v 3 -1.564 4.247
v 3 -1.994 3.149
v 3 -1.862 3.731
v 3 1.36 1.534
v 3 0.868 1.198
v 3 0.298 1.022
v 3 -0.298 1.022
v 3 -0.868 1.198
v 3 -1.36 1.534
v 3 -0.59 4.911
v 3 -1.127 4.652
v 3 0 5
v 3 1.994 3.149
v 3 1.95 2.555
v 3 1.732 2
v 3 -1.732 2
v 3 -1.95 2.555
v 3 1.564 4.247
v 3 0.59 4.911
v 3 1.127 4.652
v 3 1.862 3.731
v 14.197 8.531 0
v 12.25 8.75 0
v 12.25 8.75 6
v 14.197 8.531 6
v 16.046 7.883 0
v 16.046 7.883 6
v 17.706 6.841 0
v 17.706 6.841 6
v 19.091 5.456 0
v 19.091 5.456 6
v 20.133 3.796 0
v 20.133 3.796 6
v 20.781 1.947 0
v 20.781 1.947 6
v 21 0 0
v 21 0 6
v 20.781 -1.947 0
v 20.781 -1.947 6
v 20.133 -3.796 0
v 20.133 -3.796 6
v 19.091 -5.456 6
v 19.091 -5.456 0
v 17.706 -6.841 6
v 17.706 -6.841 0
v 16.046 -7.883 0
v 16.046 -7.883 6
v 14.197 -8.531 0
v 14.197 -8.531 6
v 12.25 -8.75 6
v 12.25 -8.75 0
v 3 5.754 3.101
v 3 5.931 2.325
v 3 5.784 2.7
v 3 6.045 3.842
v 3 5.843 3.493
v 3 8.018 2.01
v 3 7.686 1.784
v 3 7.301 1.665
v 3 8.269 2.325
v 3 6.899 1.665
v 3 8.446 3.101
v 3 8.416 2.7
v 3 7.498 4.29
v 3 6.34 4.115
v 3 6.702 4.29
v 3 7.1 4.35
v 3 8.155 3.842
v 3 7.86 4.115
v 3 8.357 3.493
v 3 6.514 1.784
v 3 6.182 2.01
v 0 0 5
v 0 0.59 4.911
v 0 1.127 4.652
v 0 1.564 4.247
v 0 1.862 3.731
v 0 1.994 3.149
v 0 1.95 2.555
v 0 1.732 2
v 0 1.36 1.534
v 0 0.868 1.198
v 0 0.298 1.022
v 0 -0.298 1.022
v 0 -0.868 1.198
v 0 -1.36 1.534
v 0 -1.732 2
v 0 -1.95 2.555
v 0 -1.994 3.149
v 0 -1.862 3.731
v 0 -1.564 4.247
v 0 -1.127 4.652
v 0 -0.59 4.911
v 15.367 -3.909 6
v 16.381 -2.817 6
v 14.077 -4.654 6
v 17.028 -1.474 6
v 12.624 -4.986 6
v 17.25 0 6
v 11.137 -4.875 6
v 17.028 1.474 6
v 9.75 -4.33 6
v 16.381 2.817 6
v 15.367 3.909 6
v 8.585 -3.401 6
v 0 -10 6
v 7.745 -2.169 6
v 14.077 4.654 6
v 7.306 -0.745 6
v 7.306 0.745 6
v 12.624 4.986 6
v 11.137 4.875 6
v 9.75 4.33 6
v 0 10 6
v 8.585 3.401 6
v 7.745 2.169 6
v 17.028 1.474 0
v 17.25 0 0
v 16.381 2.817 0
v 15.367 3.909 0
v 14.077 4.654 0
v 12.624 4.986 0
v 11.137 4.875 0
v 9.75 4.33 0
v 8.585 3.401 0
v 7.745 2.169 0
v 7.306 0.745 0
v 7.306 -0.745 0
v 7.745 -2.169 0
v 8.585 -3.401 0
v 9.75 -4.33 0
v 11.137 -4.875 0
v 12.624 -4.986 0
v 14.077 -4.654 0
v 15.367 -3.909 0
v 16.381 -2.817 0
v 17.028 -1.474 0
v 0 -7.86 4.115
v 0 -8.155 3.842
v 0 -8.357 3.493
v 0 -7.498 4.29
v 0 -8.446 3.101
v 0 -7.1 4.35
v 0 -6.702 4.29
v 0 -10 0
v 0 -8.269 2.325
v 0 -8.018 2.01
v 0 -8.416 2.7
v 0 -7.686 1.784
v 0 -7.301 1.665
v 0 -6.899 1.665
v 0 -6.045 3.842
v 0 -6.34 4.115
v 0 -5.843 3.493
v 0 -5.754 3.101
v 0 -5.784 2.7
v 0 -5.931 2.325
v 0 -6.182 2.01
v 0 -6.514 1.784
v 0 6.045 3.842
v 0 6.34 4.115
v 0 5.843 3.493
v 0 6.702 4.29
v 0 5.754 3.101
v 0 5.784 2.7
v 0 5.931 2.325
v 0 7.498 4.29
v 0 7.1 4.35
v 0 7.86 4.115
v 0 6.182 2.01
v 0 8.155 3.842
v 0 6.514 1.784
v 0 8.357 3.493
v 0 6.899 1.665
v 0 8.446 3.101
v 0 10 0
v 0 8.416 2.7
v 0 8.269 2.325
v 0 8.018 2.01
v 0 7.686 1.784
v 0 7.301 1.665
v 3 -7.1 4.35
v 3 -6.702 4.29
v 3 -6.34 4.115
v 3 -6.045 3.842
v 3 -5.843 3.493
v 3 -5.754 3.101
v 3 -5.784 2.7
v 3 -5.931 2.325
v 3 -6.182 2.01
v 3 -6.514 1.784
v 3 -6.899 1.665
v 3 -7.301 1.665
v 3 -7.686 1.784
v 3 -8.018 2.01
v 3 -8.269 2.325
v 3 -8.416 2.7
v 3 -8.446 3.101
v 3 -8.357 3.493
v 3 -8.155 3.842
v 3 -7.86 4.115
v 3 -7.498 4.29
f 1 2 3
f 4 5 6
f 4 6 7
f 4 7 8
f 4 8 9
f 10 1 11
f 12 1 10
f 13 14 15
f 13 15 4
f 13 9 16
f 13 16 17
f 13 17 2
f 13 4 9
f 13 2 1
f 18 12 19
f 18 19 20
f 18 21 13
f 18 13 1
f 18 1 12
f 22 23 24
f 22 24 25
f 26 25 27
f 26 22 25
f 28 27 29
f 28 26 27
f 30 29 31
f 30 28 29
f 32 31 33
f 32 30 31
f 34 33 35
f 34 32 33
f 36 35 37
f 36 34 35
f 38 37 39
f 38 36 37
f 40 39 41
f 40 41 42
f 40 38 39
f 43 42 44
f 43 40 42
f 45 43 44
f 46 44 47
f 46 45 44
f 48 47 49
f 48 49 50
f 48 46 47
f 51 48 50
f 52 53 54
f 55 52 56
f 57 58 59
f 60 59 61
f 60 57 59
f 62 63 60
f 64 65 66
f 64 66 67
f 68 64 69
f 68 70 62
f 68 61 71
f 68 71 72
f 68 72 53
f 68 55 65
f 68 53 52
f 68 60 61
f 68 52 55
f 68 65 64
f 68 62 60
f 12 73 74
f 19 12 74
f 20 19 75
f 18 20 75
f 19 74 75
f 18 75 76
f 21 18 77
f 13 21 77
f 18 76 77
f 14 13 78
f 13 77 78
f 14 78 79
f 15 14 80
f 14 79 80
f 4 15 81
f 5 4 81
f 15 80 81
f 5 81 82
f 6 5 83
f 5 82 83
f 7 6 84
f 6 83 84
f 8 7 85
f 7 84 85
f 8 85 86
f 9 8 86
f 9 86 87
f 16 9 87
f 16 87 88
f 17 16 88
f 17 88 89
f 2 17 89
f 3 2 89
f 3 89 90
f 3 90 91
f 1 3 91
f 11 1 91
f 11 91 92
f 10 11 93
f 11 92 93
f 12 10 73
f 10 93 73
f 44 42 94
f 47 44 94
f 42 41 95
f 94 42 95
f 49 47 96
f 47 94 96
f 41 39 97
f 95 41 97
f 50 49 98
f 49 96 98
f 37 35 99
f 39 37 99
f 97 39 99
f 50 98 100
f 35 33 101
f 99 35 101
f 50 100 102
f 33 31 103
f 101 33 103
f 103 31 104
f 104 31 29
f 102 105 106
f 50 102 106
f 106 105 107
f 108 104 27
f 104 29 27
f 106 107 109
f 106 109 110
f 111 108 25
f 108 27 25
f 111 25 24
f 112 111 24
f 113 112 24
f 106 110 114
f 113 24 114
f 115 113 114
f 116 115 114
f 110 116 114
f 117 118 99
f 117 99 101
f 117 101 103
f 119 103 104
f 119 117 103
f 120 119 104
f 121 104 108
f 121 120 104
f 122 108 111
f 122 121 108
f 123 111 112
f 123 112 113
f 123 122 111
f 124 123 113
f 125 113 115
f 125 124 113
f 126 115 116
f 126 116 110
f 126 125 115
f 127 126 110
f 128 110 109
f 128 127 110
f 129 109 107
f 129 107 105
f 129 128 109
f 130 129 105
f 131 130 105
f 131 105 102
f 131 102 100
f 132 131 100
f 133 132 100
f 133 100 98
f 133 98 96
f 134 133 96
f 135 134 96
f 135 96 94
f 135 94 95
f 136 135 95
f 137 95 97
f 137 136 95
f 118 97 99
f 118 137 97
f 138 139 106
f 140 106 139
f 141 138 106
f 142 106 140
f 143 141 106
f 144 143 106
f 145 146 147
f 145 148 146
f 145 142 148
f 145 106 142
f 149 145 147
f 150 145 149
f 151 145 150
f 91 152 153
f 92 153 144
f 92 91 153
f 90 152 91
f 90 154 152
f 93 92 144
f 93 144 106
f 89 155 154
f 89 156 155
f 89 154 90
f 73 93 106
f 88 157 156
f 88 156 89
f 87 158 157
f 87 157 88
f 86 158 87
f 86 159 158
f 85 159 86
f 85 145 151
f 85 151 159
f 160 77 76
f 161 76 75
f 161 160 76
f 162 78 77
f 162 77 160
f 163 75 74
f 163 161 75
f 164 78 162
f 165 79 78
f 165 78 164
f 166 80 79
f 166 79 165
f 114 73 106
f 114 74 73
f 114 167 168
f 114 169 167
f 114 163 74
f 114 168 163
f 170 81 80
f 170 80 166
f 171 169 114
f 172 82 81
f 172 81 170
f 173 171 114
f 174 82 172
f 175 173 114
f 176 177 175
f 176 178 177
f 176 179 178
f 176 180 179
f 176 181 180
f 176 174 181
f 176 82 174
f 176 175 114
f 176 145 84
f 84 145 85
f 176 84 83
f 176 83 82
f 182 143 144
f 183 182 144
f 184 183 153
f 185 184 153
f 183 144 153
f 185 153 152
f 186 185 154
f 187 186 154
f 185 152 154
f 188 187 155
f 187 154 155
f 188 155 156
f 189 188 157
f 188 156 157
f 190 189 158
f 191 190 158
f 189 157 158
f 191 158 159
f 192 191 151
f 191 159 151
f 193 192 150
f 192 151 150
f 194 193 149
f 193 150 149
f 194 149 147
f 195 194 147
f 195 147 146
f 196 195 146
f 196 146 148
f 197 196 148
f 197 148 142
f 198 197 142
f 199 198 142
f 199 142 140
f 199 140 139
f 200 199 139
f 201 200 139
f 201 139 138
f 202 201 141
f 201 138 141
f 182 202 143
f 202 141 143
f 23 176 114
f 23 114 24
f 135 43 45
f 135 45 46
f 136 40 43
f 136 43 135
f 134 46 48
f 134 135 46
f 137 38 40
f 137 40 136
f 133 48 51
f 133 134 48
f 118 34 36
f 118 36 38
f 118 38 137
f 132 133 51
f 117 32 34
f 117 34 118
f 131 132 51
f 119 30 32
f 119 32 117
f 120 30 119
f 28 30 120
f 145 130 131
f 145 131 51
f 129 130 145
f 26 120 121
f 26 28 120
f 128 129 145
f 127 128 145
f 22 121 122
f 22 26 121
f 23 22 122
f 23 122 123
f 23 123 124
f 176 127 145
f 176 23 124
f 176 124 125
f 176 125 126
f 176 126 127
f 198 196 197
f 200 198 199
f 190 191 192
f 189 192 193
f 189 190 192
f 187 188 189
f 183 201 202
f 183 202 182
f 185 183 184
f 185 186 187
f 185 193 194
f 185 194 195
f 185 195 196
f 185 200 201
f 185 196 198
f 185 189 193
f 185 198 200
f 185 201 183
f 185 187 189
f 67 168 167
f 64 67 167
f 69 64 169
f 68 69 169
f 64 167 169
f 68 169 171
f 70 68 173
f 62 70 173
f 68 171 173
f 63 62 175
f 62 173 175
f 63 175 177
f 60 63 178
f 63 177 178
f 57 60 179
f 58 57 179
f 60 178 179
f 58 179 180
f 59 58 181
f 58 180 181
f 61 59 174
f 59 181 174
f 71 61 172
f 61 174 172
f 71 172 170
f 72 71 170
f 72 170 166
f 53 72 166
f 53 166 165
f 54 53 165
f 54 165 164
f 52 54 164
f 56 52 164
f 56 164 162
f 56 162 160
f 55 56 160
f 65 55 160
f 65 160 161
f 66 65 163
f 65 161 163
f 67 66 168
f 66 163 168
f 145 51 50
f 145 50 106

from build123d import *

# Parameters (mm, degrees)
SKETCH1_R           = 5
BOSS_EXTRUDE1_DEPTH = 6
SKETCH2_R           = 1.35
SKETCH2_R_2         = 2
CUT_EXTRUDE1_DEPTH  = 3


with BuildPart() as part:
    # Sketch1 → Boss-Extrude1 (new body)
    with BuildSketch(Plane.XY):
        with BuildLine():
            Line((0, 0), (0, 10))
            Line((0, 10), (12.25, 8.75))
            ThreePointArc((12.25, 8.75), (21, 0), (12.25, -8.75))
            Line((12.25, -8.75), (0, -10))
            Line((0, -10), (0, 0))
        make_face()
        with Locations((12.25, 0)):
            Circle(SKETCH1_R, mode=Mode.SUBTRACT)
    extrude(amount=BOSS_EXTRUDE1_DEPTH)

    # Sketch2 → Cut-Extrude1 (cut)
    with BuildSketch(Plane.ZY):
        with Locations((3, 7.1)):
            Circle(SKETCH2_R)
        with Locations((3, -7.1)):
            Circle(SKETCH2_R)
        with Locations((3, 0)):
            Circle(SKETCH2_R_2)
    extrude(amount=-CUT_EXTRUDE1_DEPTH, mode=Mode.SUBTRACT)


solid = part.part
